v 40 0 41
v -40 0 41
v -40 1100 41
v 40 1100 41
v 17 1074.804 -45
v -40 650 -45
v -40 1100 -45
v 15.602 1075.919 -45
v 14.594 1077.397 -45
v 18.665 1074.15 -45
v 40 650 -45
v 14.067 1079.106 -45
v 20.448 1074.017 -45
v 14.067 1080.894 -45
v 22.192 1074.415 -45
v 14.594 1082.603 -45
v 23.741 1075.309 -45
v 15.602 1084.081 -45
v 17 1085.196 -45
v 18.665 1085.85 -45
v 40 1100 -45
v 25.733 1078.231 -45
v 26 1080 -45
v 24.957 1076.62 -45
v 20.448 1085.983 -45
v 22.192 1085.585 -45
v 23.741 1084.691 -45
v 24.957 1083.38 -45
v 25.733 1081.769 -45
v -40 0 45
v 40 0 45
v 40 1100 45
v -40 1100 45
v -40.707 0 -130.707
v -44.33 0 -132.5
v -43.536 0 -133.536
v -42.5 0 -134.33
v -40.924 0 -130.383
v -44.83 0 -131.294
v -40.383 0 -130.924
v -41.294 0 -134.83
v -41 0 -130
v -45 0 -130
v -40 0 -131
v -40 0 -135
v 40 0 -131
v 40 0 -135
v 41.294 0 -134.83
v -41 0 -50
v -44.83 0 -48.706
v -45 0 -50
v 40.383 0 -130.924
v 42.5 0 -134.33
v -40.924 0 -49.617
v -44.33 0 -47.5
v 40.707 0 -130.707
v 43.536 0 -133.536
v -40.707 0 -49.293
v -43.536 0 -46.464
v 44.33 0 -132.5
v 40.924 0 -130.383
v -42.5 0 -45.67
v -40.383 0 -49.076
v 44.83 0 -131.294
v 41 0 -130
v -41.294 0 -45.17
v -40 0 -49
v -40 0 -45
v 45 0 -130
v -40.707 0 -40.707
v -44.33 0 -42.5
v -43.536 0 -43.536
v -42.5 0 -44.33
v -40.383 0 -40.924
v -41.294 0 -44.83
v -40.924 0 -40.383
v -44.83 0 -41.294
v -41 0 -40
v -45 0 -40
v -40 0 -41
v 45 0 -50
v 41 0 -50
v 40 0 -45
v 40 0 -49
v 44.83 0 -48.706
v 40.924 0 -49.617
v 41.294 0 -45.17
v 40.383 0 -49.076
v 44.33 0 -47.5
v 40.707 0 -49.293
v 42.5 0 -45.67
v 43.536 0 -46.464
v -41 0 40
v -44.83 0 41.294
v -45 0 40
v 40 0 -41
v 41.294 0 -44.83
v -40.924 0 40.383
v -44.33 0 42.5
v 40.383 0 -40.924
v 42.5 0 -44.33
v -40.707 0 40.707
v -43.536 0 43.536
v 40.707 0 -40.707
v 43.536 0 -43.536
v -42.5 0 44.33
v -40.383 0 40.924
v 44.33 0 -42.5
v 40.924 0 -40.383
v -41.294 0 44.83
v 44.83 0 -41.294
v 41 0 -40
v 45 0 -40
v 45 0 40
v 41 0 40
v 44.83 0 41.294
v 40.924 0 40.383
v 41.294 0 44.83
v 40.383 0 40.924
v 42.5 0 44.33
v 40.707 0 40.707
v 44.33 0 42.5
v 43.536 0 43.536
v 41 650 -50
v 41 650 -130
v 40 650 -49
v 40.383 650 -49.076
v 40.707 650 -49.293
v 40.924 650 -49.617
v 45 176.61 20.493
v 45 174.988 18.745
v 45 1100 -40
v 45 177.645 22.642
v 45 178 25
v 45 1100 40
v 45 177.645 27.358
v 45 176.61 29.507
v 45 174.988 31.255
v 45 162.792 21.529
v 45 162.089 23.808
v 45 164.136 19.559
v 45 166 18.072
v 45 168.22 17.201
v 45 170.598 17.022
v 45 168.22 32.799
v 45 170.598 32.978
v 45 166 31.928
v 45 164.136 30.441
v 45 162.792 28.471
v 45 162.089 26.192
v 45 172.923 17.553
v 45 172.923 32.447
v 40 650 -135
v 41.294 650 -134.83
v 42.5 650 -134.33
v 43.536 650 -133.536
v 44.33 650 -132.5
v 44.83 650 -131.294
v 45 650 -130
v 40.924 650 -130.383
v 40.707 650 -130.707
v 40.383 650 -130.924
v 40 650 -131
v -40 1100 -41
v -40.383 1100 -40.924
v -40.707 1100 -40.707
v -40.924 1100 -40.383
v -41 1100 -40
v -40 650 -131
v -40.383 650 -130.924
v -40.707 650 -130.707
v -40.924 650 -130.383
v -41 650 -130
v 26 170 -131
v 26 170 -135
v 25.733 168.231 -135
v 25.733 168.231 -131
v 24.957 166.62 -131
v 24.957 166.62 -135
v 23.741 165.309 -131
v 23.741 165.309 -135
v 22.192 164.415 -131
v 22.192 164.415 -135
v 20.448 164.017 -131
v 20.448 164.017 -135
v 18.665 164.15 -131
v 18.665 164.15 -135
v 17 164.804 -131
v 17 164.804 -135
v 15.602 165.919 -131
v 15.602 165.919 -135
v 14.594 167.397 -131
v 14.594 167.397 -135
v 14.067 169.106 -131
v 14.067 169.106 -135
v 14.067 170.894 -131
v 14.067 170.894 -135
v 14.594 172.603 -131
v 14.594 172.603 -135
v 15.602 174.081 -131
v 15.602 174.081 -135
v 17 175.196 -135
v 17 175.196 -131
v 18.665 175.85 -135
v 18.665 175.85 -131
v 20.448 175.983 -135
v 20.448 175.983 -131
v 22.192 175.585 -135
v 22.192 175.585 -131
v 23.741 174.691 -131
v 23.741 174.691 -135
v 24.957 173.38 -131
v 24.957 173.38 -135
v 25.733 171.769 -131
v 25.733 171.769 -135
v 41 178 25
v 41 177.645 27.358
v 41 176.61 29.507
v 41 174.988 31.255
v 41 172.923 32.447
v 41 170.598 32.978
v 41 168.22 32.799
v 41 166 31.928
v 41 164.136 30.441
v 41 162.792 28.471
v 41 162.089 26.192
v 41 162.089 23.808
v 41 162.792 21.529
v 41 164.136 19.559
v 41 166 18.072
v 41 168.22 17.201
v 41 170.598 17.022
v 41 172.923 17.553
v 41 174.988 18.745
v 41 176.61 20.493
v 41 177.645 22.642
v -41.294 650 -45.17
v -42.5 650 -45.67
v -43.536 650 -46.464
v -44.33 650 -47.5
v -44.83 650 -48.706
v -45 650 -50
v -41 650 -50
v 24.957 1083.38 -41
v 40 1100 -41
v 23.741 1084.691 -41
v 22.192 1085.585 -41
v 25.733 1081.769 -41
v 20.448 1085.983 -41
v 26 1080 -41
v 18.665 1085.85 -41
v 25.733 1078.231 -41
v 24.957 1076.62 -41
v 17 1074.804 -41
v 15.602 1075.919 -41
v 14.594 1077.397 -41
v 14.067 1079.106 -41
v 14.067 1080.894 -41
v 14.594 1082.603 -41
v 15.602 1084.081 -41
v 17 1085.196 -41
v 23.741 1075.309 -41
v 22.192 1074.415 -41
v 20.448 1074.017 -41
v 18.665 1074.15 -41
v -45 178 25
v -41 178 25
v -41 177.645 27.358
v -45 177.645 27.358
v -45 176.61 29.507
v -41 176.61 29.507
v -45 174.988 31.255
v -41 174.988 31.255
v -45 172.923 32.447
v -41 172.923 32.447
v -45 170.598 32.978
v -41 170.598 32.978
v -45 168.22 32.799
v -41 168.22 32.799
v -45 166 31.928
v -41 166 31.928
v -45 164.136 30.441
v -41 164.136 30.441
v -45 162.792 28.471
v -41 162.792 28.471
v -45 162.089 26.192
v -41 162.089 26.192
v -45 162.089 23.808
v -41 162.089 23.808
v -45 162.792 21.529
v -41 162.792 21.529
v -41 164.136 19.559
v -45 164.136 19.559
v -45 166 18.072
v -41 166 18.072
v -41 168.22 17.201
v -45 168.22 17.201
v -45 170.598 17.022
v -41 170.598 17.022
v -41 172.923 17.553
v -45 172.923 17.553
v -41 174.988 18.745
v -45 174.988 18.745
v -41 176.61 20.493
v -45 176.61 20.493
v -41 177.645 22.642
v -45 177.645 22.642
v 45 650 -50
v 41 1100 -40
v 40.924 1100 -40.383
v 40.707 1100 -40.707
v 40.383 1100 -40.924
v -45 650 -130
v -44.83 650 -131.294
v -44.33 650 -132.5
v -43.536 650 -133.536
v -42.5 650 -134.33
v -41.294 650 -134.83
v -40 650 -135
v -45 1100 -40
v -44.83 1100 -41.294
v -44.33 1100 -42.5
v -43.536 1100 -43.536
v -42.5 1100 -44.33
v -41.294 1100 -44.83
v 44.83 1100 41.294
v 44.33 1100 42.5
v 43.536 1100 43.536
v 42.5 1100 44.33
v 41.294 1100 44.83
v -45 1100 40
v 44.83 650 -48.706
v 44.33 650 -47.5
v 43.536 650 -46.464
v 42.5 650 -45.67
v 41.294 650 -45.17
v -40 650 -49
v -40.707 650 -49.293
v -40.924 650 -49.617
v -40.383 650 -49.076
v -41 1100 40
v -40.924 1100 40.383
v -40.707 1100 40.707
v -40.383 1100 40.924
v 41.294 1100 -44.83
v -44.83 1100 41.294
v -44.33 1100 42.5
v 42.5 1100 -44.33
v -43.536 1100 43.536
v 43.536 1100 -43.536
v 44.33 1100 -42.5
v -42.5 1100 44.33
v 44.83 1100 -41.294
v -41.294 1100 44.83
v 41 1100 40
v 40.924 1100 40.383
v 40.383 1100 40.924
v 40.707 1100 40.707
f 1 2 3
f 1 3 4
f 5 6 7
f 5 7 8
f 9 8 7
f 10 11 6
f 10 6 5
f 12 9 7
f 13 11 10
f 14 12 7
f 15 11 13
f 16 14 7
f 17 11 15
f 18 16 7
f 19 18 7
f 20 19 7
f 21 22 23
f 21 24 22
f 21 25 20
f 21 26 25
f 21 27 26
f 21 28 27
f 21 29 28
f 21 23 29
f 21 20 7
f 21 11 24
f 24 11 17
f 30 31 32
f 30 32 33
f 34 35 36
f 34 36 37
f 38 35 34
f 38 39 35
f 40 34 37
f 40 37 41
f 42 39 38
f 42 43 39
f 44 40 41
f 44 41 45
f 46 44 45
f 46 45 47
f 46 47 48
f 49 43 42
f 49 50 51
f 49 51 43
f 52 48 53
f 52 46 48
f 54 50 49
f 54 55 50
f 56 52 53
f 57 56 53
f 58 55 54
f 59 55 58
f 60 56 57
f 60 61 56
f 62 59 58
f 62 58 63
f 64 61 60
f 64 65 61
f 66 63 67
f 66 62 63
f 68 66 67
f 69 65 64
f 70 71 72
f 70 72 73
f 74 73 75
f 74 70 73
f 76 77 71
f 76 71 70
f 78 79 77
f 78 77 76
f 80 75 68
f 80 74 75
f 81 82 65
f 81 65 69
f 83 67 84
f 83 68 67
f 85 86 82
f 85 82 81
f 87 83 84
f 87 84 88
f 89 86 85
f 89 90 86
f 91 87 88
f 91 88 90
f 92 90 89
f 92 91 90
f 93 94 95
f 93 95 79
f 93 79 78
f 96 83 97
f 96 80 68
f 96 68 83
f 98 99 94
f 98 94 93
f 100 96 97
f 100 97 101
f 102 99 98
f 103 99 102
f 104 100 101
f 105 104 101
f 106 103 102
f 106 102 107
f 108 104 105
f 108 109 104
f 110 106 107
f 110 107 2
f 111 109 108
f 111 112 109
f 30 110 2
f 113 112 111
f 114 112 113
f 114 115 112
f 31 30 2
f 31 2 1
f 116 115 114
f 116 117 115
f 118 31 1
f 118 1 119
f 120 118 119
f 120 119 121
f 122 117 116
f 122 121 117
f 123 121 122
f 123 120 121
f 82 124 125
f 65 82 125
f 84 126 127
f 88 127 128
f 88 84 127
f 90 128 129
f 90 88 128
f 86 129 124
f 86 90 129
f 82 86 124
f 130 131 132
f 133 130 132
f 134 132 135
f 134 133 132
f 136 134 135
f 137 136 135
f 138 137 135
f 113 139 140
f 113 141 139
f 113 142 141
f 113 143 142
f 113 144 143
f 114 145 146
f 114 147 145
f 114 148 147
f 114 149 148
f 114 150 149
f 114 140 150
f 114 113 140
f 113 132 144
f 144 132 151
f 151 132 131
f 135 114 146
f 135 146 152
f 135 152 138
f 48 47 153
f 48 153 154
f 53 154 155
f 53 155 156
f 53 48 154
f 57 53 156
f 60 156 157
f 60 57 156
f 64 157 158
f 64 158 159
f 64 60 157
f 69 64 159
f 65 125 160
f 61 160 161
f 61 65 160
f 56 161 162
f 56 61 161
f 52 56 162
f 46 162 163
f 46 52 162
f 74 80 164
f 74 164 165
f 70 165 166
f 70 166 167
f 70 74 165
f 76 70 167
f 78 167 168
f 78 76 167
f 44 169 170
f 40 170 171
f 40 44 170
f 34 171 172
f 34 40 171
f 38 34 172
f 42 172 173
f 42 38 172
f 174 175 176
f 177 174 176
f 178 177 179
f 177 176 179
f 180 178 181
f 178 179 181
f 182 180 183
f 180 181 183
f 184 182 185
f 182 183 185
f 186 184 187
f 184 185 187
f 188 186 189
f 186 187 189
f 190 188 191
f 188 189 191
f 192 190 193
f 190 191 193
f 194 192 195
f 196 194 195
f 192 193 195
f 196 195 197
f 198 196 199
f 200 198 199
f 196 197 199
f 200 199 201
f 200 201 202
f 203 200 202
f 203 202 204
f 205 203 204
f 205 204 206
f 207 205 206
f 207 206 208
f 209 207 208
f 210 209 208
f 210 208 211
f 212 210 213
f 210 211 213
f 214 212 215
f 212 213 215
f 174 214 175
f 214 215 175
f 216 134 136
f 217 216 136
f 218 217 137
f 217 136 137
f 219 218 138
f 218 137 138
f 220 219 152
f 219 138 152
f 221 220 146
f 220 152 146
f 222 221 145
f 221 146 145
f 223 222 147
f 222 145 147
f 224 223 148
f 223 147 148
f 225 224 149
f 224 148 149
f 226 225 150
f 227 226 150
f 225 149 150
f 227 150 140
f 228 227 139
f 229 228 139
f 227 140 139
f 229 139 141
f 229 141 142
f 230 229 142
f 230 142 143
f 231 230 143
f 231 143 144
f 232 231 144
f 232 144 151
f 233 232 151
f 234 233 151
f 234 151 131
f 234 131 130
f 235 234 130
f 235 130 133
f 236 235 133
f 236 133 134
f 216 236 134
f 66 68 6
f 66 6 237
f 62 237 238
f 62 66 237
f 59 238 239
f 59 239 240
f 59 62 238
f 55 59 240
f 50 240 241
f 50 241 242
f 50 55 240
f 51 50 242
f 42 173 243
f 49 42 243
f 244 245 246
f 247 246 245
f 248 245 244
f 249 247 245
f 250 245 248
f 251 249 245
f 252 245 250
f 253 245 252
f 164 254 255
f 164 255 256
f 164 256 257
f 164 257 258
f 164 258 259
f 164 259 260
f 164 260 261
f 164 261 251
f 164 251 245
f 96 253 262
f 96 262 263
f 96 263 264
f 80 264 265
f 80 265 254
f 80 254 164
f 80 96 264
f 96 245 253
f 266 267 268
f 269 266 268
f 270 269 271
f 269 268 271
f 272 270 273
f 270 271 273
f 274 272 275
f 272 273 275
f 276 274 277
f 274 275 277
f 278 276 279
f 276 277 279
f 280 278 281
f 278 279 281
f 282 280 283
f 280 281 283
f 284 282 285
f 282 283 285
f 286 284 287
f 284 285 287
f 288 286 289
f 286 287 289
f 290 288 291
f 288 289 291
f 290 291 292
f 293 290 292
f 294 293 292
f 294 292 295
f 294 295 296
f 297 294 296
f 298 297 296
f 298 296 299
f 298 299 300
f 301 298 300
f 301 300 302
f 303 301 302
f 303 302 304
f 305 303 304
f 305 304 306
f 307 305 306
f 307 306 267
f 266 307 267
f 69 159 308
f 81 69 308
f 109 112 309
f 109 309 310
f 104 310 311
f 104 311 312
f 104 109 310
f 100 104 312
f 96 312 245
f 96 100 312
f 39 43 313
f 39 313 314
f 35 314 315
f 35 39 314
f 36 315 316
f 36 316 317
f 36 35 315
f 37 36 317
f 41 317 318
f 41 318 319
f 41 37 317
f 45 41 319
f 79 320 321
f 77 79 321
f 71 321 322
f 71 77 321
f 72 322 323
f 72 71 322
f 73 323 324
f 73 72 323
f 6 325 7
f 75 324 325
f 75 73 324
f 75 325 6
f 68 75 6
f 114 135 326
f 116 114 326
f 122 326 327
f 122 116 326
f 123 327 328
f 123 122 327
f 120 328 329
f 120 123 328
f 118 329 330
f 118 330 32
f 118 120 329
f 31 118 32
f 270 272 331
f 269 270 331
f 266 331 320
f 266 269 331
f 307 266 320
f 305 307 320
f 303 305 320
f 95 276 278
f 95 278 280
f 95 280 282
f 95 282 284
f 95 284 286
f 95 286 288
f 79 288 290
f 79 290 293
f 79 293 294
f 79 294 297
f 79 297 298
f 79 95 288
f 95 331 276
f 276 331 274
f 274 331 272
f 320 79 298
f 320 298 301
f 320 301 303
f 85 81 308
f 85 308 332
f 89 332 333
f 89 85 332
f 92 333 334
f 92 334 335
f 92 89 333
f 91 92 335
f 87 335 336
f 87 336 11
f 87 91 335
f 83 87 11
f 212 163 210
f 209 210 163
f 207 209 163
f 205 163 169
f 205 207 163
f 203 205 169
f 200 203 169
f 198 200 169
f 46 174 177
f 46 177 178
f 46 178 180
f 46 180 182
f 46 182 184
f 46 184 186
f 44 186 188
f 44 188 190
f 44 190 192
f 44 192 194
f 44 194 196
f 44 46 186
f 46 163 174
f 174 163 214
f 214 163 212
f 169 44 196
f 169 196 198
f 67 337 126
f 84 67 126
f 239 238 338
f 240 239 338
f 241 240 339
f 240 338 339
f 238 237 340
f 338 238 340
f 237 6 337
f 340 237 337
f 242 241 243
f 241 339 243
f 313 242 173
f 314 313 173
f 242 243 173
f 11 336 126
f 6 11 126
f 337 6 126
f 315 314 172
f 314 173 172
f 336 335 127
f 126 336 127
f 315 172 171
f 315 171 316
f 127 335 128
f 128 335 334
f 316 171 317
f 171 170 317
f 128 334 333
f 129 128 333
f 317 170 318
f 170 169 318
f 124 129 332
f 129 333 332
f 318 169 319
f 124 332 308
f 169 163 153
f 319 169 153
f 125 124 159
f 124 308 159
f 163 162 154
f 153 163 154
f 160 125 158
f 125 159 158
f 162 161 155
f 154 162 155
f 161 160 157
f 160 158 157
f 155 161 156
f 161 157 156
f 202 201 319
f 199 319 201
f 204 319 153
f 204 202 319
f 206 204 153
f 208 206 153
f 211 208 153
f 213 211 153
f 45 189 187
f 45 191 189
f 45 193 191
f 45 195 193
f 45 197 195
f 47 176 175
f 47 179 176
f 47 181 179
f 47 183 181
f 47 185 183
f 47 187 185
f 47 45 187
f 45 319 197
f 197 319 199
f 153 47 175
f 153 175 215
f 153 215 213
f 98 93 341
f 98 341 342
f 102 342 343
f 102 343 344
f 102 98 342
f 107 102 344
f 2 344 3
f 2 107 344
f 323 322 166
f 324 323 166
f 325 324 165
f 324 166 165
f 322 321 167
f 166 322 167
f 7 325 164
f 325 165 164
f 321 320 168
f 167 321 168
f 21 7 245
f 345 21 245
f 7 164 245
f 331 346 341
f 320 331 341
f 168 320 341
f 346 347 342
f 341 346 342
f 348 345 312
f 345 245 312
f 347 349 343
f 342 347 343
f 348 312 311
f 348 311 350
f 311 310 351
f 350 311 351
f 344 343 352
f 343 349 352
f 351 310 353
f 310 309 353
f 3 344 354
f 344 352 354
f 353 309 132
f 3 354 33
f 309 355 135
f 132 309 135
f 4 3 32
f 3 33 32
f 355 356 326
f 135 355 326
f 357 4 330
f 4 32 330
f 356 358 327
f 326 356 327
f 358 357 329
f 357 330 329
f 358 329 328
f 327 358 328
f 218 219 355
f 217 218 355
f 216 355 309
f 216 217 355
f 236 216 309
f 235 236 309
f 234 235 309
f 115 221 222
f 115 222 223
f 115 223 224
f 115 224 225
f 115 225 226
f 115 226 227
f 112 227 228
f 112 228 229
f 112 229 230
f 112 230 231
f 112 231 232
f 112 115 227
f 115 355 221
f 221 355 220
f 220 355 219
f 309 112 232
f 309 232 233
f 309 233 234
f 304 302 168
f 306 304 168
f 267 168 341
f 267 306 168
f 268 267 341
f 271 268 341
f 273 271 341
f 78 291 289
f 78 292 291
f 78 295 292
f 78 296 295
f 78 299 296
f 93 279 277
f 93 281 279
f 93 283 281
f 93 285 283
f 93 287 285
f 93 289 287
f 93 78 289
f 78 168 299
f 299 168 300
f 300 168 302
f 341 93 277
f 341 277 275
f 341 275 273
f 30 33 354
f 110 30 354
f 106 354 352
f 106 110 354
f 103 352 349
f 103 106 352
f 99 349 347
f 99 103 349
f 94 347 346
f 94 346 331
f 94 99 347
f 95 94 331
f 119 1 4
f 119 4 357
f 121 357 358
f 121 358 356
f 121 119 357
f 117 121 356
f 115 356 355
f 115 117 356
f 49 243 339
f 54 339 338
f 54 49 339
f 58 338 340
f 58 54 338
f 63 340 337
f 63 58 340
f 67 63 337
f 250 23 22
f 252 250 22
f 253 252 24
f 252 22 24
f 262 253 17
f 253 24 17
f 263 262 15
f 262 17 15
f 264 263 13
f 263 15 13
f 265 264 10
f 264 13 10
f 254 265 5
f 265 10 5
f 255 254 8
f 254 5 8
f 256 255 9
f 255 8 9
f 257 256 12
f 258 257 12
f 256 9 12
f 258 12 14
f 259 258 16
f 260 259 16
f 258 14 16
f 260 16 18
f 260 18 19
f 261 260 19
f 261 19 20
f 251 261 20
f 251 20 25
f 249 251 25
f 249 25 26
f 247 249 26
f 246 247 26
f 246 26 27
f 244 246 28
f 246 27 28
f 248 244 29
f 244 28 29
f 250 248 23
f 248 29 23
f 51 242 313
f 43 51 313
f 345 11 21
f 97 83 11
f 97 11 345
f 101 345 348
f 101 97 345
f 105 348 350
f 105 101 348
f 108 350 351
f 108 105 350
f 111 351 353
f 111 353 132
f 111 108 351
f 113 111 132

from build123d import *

# Parameters (mm, degrees)
F1_DEPTH = 1100
F2_R     = 8
F3_DEPTH = 90.001
F4_W     = 450
F4_H     = 80
F4_H_2   = 5
F5_DEPTH = 90.001
F6_R     = 6
F7_DEPTH = 4
F8_R     = 6
F9_DEPTH = 4


with BuildPart() as f1:
    # F0 (on Front) → F1 (new body)
    with BuildSketch(Plane.XZ):
        with BuildLine():
            ThreePointArc((45, 40), (43.5355339059, 43.5355339059), (40, 45))
            Line((40, 45), (-40, 45))
            ThreePointArc((-40, 45), (-43.5355339059, 43.5355339059), (-45, 40))
            Line((-45, 40), (-45, -40))
            ThreePointArc((-45, -40), (-43.5355339059, -43.5355339059), (-40, -45))
            Line((-40, -45), (40, -45))
            ThreePointArc((40, -45), (43.5355339059, -43.5355339059), (45, -40))
            Line((45, -40), (45, 40))
        make_face()
        with BuildLine():
            ThreePointArc((-41, 40), (-40.7071067812, 40.7071067812), (-40, 41))
            Line((-40, 41), (40, 41))
            ThreePointArc((40, 41), (40.7071067812, 40.7071067812), (41, 40))
            Line((41, 40), (41, -40))
            ThreePointArc((41, -40), (40.7071067812, -40.7071067812), (40, -41))
            Line((40, -41), (-40, -41))
            ThreePointArc((-40, -41), (-40.7071067812, -40.7071067812), (-41, -40))
            Line((-41, -40), (-41, 40))
        make_face(mode=Mode.SUBTRACT)
        with BuildLine():
            ThreePointArc((45, -50), (43.5355339059, -46.4644660941), (40, -45))
            Line((40, -45), (-40, -45))
            ThreePointArc((-40, -45), (-43.5355339059, -46.4644660941), (-45, -50))
            Line((-45, -50), (-45, -130))
            ThreePointArc((-45, -130), (-43.5355339059, -133.5355339059), (-40, -135))
            Line((-40, -135), (40, -135))
            ThreePointArc((40, -135), (43.5355339059, -133.5355339059), (45, -130))
            Line((45, -130), (45, -50))
        make_face()
        with BuildLine():
            ThreePointArc((-41, -50), (-40.7071067812, -49.2928932188), (-40, -49))
            Line((-40, -49), (40, -49))
            ThreePointArc((40, -49), (40.7071067812, -49.2928932188), (41, -50))
            Line((41, -50), (41, -130))
            ThreePointArc((41, -130), (40.7071067812, -130.7071067812), (40, -131))
            Line((40, -131), (-40, -131))
            ThreePointArc((-40, -131), (-40.7071067812, -130.7071067812), (-41, -130))
            Line((-41, -130), (-41, -50))
        make_face(mode=Mode.SUBTRACT)
    extrude(amount=-F1_DEPTH)

    # F2 (on face) → F3 (cut, through all)
    with BuildSketch(Plane.YZ.offset(45)):
        with Locations((170, 25)):
            Circle(F2_R)
    extrude(amount=-F3_DEPTH, mode=Mode.SUBTRACT)

    # F4 (on face) → F5 (cut, through all)
    with BuildSketch(Plane.YZ.offset(45)):
        with Locations((875, -90)):
            Rectangle(F4_W, F4_H)
        with Locations((875, -47.5)):
            Rectangle(F4_W, F4_H_2)
        with Locations((875, -132.5)):
            Rectangle(F4_W, F4_H_2)
    extrude(amount=-F5_DEPTH, mode=Mode.SUBTRACT)

    # F6 (on face) → F7 (cut, through all)
    with BuildSketch(Plane(origin=(0, 0, -135), x_dir=(1, 0, 0), z_dir=(0, 0, -1))):
        with Locations((20, -170)):
            Circle(F6_R)
    extrude(amount=-F7_DEPTH, mode=Mode.SUBTRACT)

    # F8 (on face) → F9 (cut, through all)
    with BuildSketch(Plane(origin=(0, 0, -45), x_dir=(1, 0, 0), z_dir=(0, 0, -1))):
        with Locations((20, -1080)):
            Circle(F8_R)
    extrude(amount=-F9_DEPTH, mode=Mode.SUBTRACT)


solid = f1.part
